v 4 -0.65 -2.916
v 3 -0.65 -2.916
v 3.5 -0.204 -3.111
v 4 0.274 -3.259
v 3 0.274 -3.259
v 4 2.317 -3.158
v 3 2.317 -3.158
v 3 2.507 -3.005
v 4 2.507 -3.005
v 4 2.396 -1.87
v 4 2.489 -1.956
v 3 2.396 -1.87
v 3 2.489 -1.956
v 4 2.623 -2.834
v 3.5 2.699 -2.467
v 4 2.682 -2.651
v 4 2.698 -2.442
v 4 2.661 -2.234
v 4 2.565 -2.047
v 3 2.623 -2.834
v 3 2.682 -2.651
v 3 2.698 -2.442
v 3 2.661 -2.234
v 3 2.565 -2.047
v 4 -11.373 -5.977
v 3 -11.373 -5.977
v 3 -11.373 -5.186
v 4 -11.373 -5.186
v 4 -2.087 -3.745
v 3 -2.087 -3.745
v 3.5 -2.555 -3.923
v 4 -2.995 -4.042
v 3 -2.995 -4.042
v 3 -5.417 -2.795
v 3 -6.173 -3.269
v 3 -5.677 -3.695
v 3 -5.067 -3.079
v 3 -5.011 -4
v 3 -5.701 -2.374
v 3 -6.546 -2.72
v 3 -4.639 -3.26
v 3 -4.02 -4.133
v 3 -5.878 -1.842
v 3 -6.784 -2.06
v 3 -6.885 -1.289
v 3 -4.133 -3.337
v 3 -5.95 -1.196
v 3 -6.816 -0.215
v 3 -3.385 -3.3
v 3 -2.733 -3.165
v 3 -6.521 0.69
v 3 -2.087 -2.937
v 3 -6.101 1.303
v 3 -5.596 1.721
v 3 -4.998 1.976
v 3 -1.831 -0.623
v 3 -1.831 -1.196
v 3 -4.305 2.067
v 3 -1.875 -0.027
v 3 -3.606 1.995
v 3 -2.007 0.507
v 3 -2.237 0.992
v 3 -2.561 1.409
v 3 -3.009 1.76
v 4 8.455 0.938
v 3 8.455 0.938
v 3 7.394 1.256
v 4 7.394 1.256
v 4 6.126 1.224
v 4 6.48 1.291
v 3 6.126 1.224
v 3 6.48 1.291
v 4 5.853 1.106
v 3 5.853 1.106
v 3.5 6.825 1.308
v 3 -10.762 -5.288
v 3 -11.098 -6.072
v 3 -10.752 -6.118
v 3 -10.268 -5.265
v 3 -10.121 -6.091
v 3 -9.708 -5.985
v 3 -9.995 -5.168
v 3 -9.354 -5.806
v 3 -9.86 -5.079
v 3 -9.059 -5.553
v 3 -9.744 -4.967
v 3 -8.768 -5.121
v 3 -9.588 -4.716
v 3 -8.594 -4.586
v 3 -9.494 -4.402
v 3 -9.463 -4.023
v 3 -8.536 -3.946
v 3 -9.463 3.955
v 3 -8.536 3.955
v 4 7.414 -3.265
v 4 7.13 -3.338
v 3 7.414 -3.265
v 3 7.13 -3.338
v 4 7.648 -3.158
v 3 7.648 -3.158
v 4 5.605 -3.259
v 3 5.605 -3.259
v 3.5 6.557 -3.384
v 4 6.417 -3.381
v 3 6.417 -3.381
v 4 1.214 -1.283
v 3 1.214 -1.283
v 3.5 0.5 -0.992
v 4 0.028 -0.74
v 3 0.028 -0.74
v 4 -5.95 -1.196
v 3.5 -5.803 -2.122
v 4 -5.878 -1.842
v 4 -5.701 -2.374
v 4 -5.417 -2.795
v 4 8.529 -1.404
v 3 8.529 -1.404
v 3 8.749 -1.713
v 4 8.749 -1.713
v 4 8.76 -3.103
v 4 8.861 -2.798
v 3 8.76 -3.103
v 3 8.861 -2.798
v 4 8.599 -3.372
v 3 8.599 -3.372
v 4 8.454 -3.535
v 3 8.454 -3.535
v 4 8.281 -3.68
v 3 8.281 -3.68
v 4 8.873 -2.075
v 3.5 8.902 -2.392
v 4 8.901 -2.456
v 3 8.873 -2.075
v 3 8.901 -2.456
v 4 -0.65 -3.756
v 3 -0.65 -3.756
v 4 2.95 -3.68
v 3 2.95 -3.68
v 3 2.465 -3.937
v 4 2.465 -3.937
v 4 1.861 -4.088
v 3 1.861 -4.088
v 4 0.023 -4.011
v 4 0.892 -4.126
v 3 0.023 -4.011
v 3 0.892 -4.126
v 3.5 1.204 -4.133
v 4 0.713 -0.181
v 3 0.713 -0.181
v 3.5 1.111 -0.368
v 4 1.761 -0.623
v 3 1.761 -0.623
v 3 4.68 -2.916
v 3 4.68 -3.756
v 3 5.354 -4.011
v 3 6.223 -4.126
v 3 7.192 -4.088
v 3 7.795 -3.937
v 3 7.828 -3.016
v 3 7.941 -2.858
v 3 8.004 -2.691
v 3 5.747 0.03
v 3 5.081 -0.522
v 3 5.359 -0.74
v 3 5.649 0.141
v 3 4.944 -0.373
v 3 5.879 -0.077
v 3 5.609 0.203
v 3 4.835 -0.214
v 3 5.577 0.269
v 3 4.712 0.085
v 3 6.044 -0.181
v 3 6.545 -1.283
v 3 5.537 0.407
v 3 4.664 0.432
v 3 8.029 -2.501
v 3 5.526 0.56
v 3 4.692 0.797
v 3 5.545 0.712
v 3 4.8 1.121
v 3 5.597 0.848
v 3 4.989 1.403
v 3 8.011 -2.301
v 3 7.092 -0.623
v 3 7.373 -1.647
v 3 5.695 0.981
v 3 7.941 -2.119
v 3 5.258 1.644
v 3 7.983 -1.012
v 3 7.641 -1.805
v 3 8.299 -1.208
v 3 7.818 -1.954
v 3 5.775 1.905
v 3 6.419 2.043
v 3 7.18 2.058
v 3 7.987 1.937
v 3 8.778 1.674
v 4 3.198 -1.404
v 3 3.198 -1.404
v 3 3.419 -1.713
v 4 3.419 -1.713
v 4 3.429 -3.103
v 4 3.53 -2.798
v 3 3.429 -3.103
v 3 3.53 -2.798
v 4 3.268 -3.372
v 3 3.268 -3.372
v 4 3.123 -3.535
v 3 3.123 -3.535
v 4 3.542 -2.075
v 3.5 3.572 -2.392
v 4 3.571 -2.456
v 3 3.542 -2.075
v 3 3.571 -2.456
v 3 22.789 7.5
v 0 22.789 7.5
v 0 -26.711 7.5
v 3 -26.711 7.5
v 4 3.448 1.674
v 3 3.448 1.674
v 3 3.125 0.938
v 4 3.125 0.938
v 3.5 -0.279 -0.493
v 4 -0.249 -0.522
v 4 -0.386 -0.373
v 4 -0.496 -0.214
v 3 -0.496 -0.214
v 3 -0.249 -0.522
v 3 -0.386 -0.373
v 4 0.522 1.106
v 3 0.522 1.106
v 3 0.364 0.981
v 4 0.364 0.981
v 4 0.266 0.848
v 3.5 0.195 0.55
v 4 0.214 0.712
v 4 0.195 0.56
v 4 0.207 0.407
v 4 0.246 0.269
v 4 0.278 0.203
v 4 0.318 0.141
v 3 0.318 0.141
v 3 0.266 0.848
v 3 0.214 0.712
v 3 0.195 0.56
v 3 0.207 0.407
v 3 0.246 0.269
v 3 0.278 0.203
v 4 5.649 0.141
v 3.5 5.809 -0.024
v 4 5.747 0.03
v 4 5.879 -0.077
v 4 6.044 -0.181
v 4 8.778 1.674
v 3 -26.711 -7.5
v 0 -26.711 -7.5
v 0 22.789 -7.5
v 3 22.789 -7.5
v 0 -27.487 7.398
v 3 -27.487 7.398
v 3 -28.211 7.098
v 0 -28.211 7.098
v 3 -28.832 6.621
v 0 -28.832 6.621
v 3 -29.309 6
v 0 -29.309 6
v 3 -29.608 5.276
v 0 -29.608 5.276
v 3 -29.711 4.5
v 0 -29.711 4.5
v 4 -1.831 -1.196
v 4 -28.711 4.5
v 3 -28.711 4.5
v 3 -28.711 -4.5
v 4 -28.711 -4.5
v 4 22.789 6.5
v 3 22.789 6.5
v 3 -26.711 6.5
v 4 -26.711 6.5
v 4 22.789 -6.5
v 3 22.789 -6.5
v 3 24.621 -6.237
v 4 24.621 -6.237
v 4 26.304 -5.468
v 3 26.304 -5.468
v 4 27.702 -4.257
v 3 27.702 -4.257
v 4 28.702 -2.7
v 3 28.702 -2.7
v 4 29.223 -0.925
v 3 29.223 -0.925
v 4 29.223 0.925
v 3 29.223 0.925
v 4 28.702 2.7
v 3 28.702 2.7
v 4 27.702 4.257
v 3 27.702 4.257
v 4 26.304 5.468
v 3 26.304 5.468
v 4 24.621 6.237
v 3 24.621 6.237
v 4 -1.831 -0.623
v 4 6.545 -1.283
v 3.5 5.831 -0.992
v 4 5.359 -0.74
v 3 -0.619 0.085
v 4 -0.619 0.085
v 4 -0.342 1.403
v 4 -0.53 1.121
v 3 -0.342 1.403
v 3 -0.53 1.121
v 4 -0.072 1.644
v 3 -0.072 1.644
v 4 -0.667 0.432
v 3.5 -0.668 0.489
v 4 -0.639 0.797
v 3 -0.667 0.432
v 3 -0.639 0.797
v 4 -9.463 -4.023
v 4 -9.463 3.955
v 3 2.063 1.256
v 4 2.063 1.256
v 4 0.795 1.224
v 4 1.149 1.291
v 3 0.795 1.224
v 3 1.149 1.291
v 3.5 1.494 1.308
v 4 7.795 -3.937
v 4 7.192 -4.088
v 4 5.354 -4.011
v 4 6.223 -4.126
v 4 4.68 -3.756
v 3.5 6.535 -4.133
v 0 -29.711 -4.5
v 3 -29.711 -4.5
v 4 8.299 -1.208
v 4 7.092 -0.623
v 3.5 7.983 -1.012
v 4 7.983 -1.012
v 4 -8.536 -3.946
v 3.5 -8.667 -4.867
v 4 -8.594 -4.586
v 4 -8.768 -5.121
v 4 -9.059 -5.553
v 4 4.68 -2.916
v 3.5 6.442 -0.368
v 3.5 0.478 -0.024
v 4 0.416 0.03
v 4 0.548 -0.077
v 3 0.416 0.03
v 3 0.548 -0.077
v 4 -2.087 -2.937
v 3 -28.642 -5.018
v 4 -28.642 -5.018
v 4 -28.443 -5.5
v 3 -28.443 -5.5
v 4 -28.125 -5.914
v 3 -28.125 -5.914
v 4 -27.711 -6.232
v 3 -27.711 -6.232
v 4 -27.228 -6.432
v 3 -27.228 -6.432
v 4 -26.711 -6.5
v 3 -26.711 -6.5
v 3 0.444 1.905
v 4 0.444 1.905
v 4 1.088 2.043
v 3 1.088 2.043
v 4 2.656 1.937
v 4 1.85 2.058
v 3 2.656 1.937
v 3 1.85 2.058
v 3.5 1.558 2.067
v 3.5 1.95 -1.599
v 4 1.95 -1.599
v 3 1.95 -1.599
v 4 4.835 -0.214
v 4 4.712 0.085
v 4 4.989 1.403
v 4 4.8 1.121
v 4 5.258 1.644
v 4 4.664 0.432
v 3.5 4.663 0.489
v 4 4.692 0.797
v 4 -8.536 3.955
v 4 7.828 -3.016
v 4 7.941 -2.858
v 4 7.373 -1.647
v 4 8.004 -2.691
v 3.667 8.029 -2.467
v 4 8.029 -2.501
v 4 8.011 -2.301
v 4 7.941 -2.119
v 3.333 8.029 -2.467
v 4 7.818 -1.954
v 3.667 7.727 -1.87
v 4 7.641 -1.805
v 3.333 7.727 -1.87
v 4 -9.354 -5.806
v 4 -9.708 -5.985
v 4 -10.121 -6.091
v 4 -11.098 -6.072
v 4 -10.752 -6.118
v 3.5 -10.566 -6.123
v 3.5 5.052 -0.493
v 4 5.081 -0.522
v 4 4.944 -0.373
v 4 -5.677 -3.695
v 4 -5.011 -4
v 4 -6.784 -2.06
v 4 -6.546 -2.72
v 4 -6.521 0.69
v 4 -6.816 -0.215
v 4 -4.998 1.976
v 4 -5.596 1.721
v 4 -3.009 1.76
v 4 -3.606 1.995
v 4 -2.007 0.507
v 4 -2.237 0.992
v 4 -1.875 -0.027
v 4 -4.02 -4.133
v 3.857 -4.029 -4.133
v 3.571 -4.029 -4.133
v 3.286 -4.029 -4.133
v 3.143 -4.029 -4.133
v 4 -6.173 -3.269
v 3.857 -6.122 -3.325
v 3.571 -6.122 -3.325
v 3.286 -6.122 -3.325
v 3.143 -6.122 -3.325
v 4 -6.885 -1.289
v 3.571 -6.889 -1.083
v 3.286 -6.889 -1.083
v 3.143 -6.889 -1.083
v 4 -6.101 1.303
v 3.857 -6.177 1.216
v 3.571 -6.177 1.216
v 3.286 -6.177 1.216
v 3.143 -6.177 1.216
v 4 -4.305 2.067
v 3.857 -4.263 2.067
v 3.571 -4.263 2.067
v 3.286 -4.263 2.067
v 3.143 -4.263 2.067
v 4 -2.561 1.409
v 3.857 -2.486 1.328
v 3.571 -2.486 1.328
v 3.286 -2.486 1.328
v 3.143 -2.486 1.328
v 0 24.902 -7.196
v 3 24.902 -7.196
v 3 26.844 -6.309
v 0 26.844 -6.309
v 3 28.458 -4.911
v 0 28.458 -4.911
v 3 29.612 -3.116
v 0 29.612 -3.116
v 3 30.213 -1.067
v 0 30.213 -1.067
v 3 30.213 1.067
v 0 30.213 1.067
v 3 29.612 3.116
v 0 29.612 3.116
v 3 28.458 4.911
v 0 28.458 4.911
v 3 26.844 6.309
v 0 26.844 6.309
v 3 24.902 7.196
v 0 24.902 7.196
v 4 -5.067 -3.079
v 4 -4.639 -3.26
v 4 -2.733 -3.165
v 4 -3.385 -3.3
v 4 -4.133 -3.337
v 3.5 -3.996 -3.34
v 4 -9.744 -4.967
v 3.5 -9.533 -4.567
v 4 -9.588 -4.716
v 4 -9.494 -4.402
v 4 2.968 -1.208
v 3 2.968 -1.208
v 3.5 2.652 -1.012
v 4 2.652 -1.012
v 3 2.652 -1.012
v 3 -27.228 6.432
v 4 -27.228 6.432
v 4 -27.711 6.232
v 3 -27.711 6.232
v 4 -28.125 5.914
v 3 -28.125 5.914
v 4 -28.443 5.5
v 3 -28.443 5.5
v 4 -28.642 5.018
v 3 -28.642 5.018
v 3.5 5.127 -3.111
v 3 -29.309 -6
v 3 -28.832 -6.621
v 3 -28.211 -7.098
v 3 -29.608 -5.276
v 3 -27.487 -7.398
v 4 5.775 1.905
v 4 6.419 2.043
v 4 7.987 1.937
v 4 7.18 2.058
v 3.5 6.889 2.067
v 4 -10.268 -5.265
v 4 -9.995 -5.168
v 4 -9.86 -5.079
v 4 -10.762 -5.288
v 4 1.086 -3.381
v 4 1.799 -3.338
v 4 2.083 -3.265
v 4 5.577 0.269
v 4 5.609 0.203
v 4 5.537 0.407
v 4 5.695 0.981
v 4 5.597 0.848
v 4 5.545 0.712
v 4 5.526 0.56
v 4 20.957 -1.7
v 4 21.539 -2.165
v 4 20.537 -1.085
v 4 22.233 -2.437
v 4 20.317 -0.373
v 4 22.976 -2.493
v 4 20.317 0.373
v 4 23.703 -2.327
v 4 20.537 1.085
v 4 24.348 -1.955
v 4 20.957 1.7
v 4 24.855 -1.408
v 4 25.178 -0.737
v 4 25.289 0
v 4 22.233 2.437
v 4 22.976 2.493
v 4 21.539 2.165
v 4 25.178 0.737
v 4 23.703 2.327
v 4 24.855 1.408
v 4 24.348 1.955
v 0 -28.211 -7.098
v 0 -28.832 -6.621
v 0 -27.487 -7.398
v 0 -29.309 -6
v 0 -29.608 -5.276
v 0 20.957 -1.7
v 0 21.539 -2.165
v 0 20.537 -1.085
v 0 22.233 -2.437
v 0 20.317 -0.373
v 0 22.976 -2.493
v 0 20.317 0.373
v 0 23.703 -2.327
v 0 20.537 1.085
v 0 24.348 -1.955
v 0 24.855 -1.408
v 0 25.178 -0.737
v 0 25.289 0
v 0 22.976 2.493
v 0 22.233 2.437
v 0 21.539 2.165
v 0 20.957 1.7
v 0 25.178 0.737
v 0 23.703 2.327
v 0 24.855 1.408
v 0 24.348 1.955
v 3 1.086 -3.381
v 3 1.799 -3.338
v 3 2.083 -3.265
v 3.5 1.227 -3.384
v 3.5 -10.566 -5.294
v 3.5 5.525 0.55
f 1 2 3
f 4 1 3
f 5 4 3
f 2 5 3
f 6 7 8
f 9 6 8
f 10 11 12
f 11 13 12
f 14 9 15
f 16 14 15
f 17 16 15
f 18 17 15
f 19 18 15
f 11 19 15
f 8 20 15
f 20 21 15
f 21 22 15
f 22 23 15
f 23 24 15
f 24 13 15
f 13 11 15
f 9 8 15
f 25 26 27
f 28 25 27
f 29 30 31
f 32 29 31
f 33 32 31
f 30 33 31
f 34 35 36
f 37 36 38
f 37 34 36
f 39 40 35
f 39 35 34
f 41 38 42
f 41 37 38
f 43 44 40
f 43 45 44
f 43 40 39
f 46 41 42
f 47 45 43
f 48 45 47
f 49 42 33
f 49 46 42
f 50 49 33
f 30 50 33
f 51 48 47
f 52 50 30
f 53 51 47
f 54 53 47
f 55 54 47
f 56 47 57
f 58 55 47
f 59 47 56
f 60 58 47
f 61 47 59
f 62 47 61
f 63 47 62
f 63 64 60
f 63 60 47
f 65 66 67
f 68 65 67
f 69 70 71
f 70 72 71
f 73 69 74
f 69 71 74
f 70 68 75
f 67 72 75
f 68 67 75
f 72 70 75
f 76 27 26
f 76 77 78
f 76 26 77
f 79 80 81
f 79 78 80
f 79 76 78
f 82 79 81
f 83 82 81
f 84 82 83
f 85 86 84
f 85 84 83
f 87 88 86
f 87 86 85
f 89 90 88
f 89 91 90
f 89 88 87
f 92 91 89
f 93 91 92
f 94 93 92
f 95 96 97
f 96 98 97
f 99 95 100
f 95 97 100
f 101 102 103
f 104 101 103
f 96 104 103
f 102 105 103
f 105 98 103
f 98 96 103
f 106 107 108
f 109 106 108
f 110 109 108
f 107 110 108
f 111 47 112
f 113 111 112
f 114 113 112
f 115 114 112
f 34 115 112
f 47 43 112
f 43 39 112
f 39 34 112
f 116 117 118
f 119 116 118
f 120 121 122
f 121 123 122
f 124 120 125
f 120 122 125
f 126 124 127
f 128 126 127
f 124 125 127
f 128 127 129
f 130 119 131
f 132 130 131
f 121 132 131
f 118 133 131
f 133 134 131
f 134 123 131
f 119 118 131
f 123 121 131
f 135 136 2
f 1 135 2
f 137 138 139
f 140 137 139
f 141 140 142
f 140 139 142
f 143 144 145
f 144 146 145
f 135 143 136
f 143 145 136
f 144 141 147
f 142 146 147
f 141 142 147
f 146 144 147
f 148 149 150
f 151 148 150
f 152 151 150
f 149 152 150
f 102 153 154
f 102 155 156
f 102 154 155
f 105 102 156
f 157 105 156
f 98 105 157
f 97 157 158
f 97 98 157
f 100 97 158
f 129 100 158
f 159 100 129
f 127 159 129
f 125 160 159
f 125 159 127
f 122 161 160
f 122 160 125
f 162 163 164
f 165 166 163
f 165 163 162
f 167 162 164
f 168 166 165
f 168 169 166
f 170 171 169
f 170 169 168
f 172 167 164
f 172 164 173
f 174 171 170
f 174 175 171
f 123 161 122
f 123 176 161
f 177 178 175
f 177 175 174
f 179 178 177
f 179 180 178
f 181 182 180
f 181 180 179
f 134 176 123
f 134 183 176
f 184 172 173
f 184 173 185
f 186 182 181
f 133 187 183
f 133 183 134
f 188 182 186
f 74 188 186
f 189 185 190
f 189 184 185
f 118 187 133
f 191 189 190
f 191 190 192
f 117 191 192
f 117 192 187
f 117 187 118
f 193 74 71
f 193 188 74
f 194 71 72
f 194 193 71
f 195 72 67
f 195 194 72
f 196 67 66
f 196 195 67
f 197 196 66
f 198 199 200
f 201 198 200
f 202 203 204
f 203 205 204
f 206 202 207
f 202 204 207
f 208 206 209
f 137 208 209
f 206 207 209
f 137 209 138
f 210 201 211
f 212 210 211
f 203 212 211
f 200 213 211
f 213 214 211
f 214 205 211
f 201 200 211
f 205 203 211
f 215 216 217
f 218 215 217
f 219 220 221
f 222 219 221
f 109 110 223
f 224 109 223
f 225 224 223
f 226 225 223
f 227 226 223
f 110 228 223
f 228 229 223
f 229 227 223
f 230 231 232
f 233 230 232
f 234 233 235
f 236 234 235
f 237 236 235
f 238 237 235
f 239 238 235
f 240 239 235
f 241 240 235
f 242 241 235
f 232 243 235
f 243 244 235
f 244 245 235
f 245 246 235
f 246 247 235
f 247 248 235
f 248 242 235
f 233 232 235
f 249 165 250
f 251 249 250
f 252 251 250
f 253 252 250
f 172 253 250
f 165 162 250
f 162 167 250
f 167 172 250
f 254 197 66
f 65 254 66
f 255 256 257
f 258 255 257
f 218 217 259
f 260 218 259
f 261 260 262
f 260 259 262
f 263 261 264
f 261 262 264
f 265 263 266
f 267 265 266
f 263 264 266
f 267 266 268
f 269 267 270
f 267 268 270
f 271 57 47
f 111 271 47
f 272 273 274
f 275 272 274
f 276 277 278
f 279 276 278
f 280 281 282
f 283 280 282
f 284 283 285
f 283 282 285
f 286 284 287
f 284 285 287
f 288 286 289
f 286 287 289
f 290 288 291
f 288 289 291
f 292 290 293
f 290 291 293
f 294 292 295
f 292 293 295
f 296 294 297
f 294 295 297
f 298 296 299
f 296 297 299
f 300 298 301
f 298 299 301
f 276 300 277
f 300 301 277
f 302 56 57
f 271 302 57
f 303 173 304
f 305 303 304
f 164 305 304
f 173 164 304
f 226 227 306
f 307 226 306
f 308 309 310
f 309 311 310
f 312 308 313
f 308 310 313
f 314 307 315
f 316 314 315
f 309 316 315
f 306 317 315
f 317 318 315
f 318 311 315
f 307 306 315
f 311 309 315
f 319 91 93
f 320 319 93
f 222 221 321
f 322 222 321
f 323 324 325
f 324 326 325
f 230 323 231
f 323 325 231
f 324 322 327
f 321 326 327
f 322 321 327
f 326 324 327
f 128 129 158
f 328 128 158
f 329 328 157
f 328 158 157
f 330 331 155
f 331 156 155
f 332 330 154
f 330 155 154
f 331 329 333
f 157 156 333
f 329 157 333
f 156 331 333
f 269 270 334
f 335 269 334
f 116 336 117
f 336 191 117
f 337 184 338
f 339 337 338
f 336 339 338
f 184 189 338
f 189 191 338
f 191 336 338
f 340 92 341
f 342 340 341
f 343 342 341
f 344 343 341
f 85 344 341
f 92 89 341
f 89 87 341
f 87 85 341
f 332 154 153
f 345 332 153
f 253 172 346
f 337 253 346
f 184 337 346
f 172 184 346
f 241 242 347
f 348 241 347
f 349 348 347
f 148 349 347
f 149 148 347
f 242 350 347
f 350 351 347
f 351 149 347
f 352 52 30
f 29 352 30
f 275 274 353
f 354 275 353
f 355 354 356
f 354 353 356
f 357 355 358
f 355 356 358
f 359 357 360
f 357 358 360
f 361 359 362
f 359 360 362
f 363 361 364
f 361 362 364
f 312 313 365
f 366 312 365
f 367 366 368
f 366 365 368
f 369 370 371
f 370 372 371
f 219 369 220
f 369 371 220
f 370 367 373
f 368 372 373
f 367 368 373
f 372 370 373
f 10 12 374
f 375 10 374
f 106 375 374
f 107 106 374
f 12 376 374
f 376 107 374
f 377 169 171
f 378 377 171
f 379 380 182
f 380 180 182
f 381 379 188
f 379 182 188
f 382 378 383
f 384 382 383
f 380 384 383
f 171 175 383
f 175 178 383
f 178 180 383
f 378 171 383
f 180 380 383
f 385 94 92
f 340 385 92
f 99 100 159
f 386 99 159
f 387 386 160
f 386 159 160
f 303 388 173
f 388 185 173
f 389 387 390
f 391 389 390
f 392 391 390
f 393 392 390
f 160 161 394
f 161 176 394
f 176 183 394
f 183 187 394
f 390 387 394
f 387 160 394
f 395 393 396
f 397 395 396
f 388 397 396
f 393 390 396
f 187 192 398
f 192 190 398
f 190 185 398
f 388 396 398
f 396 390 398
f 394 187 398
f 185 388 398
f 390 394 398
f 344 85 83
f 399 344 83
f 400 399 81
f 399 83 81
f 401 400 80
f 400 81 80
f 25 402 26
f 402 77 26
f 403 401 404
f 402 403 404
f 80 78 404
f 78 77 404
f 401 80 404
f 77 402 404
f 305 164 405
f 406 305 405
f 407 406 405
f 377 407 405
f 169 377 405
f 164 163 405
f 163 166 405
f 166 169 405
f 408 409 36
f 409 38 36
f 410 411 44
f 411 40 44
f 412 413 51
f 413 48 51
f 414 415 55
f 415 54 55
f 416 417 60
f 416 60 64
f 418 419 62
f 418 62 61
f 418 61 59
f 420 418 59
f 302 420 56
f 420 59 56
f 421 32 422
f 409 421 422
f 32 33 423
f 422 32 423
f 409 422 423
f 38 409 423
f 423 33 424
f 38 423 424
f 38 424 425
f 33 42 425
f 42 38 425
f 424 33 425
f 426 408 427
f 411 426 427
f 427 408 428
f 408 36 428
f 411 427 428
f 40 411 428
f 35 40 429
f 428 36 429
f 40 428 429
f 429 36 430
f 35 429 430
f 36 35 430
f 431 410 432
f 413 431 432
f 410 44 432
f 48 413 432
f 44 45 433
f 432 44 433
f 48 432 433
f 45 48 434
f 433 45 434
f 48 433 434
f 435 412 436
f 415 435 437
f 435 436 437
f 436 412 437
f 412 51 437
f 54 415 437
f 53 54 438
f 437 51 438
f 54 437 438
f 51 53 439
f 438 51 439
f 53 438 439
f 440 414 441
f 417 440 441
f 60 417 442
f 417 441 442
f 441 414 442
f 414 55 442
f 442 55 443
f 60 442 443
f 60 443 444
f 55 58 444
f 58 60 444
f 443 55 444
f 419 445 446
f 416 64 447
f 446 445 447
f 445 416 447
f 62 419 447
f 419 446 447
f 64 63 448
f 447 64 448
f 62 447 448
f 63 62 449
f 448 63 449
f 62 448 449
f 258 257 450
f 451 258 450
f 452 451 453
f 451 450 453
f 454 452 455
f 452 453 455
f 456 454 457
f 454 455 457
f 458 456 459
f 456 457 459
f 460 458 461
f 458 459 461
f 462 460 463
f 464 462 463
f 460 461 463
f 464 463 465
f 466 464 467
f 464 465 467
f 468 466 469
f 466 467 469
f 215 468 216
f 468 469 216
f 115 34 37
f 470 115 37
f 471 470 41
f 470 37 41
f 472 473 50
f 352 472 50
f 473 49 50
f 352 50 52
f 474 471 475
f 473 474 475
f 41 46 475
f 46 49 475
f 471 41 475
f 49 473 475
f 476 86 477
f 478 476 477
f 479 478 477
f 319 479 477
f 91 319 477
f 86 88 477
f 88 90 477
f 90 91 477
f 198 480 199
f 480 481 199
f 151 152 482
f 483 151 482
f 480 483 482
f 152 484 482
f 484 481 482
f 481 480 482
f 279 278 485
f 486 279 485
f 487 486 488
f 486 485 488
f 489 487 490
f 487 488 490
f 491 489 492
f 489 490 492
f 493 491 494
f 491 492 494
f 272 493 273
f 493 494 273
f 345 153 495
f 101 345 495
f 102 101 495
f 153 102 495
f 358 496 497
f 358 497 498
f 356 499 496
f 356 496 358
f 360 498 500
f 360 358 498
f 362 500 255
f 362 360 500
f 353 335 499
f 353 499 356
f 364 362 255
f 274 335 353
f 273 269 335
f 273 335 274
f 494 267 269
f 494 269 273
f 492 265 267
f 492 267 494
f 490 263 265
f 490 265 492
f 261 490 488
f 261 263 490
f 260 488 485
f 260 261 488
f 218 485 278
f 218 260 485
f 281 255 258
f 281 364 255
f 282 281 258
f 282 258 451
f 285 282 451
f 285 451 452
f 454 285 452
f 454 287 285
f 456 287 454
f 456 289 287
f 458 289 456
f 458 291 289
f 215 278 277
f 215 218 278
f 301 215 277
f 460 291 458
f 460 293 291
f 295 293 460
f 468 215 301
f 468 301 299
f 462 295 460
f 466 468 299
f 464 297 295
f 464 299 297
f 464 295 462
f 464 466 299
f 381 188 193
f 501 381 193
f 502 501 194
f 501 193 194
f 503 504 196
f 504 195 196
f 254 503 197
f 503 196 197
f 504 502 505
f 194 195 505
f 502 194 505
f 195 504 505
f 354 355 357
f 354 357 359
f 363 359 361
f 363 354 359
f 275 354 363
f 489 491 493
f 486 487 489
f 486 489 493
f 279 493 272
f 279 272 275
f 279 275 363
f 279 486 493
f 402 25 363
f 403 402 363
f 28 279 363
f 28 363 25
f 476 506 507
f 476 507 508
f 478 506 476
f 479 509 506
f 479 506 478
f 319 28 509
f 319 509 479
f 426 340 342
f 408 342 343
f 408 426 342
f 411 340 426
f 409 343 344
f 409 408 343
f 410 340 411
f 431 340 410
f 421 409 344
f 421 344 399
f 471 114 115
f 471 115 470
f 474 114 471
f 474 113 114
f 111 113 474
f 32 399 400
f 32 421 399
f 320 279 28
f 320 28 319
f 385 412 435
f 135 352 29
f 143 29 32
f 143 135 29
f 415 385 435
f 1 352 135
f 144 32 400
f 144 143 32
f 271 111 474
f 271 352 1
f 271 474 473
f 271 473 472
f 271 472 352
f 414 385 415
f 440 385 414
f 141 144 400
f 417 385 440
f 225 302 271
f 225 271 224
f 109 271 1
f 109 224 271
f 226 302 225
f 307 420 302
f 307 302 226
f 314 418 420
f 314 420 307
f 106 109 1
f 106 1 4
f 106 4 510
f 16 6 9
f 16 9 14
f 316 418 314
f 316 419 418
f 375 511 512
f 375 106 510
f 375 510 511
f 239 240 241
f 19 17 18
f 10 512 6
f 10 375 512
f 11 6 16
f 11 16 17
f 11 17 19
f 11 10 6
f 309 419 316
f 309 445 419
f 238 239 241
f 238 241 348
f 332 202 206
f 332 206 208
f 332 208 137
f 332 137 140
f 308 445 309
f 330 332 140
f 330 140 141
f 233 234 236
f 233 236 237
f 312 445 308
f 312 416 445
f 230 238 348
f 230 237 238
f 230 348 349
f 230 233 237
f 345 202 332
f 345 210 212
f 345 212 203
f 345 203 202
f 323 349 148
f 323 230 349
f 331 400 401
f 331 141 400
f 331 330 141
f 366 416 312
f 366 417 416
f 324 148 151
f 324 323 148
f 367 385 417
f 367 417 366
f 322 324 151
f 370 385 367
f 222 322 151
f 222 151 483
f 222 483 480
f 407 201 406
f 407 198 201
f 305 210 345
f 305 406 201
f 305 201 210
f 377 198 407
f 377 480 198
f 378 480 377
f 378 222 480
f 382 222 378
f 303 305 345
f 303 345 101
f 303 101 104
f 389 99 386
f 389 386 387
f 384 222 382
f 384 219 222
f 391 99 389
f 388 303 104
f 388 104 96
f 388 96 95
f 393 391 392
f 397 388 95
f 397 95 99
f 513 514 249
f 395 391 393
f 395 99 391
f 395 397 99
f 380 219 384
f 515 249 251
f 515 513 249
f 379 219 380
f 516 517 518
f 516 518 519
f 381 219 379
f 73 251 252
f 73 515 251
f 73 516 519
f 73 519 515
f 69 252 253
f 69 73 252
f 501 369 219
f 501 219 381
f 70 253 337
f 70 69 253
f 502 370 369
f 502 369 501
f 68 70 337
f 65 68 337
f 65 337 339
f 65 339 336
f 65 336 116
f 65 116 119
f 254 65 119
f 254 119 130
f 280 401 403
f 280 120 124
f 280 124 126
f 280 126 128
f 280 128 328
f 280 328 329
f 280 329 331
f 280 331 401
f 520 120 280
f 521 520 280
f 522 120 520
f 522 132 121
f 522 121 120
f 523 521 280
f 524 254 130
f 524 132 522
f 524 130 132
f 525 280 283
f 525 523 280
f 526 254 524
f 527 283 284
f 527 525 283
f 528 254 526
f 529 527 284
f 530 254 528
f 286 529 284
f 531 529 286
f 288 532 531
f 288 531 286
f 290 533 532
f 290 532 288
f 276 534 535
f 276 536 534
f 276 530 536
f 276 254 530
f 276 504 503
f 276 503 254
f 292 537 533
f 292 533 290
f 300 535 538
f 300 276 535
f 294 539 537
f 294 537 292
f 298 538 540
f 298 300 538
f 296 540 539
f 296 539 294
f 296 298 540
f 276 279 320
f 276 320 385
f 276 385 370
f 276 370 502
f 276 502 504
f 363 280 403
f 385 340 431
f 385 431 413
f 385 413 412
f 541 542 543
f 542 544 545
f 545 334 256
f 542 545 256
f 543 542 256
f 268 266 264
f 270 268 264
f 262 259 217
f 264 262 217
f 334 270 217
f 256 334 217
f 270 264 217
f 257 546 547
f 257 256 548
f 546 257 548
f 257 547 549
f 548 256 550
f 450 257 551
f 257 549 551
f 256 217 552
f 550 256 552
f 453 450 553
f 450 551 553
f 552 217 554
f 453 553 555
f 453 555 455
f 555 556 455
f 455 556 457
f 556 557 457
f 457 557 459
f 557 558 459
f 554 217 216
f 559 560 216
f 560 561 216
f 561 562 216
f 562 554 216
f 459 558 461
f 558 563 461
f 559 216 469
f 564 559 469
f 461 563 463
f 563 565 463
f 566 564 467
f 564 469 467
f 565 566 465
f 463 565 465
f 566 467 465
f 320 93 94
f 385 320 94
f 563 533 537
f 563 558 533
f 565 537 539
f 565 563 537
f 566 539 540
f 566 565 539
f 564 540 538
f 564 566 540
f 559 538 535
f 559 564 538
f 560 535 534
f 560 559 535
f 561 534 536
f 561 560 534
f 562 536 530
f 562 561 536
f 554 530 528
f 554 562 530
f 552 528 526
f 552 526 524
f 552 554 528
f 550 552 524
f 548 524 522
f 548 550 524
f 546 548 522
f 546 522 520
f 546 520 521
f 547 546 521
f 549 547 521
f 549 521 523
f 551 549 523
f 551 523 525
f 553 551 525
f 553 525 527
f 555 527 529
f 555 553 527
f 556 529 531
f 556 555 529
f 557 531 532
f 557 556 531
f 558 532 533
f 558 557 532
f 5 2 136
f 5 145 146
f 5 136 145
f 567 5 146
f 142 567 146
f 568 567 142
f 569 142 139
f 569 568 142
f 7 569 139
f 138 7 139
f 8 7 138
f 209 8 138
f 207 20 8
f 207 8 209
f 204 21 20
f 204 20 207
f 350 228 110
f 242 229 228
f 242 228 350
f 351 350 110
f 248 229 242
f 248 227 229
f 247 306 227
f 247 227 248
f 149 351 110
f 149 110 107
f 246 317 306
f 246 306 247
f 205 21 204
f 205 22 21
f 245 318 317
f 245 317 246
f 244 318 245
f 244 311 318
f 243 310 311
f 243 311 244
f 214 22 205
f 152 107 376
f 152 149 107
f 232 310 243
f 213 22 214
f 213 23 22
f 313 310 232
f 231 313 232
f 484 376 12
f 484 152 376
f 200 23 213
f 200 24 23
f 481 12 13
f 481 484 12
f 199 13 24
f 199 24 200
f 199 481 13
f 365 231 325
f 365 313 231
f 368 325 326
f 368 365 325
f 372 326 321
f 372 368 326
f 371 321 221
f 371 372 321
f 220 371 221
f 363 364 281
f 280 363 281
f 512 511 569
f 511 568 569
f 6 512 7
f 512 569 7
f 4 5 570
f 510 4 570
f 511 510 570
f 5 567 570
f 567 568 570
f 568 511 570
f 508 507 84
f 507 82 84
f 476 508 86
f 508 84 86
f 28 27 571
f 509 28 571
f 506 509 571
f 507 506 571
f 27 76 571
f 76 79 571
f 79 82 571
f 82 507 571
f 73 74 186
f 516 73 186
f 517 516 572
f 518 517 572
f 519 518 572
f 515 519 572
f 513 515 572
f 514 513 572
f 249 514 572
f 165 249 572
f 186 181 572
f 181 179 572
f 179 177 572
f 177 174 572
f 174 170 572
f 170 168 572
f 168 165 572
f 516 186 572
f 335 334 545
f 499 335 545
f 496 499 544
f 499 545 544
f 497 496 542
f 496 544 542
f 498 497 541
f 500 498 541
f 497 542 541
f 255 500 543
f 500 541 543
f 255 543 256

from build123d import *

# Parameters (mm, degrees)
F0_R     = 2.5
F1_DEPTH = 3
F2_R     = 2.5
F3_DEPTH = 1


# Not quite as in the source:
# - a feature names something its author has since deleted; it is built from what else it names


with BuildPart() as f1:
    # F0 (on Right) → F1 (new body)
    with BuildSketch(Plane.YZ):
        with BuildLine():
            Line((22.7894122154, 7.5), (-26.7105877846, 7.5))
            ThreePointArc((-26.7105877846, 7.5), (-28.8319081282, 6.6213203436), (-29.7105877846, 4.5))
            Line((-29.7105877846, 4.5), (-29.7105877846, -4.5))
            ThreePointArc((-29.7105877846, -4.5), (-28.8319081282, -6.6213203436), (-26.7105877846, -7.5))
            Line((-26.7105877846, -7.5), (22.7894122154, -7.5))
            ThreePointArc((22.7894122154, -7.5), (30.2894122154, 0), (22.7894122154, 7.5))
        make_face()
        with Locations((22.7894122154, 0)):
            Circle(F0_R, mode=Mode.SUBTRACT)
    extrude(amount=F1_DEPTH)

    # F2 (on face) → F3 (join)
    with BuildSketch(Plane.YZ.offset(3)):
        with BuildLine():
            Line((22.7894122154, 6.5), (-26.7105877846, 6.5))
            ThreePointArc((-26.7105877846, 6.5), (-28.124801347, 5.9142135624), (-28.7105877846, 4.5))
            Line((-28.7105877846, 4.5), (-28.7105877846, -4.5))
            ThreePointArc((-28.7105877846, -4.5), (-28.124801347, -5.9142135624), (-26.7105877846, -6.5))
            Line((-26.7105877846, -6.5), (22.7894122154, -6.5))
            ThreePointArc((22.7894122154, -6.5), (29.2894122154, 0), (22.7894122154, 6.5))
        make_face()
        with BuildLine():
            add(Edge.make_bspline(
                [(-9.0594911449, -5.5533798952), (-9.5833125468, -6.1234721876), (-10.5663507109, -6.1234721876)],
                knots=[0, 0, 0, 1, 1, 1], degree=2))
            add(Edge.make_bspline(
                [(-10.5663507109, -6.1234721876), (-11.0779496134, -6.1234721876), (-11.3730356697, -5.9768021951)],
                knots=[0, 0, 0, 1, 1, 1], degree=2))
            Line((-11.3730356697, -5.9768021951), (-11.3730356697, -5.1858318783))
            add(Edge.make_bspline(
                [(-11.3730356697, -5.1858318783), (-10.9854078324, -5.2940883013), (-10.5663507109, -5.2940883013)],
                knots=[0, 0, 0, 1, 1, 1], degree=2))
            add(Edge.make_bspline(
                [(-10.5663507109, -5.2940883013), (-10.0250685957, -5.2940883013), (-9.74395111, -4.9666999252)],
                knots=[0, 0, 0, 1, 1, 1], degree=2))
            add(Edge.make_bspline(
                [(-9.74395111, -4.9666999252), (-9.4628336243, -4.639311549), (-9.4628336243, -4.0229483662)],
                knots=[0, 0, 0, 1, 1, 1], degree=2))
            Line((-9.4628336243, -4.0229483662), (-9.4628336243, 3.9548515839))
            Line((-9.4628336243, 3.9548515839), (-8.5356697431, 3.9548515839))
            Line((-8.5356697431, 3.9548515839), (-8.5356697431, -3.9461212272))
            add(Edge.make_bspline(
                [(-8.5356697431, -3.9461212272), (-8.5356697431, -4.9832876029), (-9.0594911449, -5.5533798952)],
                knots=[0, 0, 0, 1, 1, 1], degree=2))
        make_face(mode=Mode.SUBTRACT)
        with BuildLine():
            add(Edge.make_bspline(
                [(-2.9953853829, -4.0421551509), (-3.4231728611, -4.1329508606), (-4.0290596159, -4.1329508606)],
                knots=[0, 0, 0, 1, 1, 1], degree=2))
            add(Edge.make_bspline(
                [(-4.0290596159, -4.1329508606), (-5.3543277625, -4.1329508606), (-6.1217261162, -3.3245198304)],
                knots=[0, 0, 0, 1, 1, 1], degree=2))
            add(Edge.make_bspline(
                [(-6.1217261162, -3.3245198304), (-6.8891244699, -2.5160888002), (-6.8891244699, -1.0825642305)],
                knots=[0, 0, 0, 1, 1, 1], degree=2))
            add(Edge.make_bspline(
                [(-6.8891244699, -1.0825642305), (-6.8891244699, 0.36492891), (-6.1767273634, 1.216138688)],
                knots=[0, 0, 0, 1, 1, 1], degree=2))
            add(Edge.make_bspline(
                [(-6.1767273634, 1.216138688), (-5.4643302569, 2.067348466), (-4.2630331754, 2.067348466)],
                knots=[0, 0, 0, 1, 1, 1], degree=2))
            add(Edge.make_bspline(
                [(-4.2630331754, 2.067348466), (-3.1403093041, 2.067348466), (-2.4855325518, 1.3278872537)],
                knots=[0, 0, 0, 1, 1, 1], degree=2))
            add(Edge.make_bspline(
                [(-2.4855325518, 1.3278872537), (-1.8307557995, 0.5884260414), (-1.8307557995, -0.6233474682)],
                knots=[0, 0, 0, 1, 1, 1], degree=2))
            Line((-1.8307557995, -0.6233474682), (-1.8307557995, -1.1960588675))
            Line((-1.8307557995, -1.1960588675), (-5.9497380893, -1.1960588675))
            add(Edge.make_bspline(
                [(-5.9497380893, -1.1960588675), (-5.9218009479, -2.2489398853), (-5.4171863308, -2.7945871788)],
                knots=[0, 0, 0, 1, 1, 1], degree=2))
            add(Edge.make_bspline(
                [(-5.4171863308, -2.7945871788), (-4.9125717136, -3.3402344724), (-3.9958842604, -3.3402344724)],
                knots=[0, 0, 0, 1, 1, 1], degree=2))
            add(Edge.make_bspline(
                [(-3.9958842604, -3.3402344724), (-3.0303068097, -3.3402344724), (-2.0874282864, -2.936891993)],
                knots=[0, 0, 0, 1, 1, 1], degree=2))
            Line((-2.0874282864, -2.936891993), (-2.0874282864, -3.7453230232))
            add(Edge.make_bspline(
                [(-2.0874282864, -3.7453230232), (-2.5675979047, -3.9513594413), (-2.9953853829, -4.0421551509)],
                knots=[0, 0, 0, 1, 1, 1], degree=2))
        make_face(mode=Mode.SUBTRACT)
        with BuildLine():
            add(Edge.make_bspline(
                [(3.1979296583, -1.4038413569), (3.5715889249, -1.7967074083), (3.5715889249, -2.3921177351)],
                knots=[0, 0, 0, 1, 1, 1], degree=2))
            add(Edge.make_bspline(
                [(3.5715889249, -2.3921177351), (3.5715889249, -3.2267398354), (2.9499875281, -3.679845348)],
                knots=[0, 0, 0, 1, 1, 1], degree=2))
            add(Edge.make_bspline(
                [(2.9499875281, -3.679845348), (2.3283861312, -4.1329508606), (1.2039161886, -4.1329508606)],
                knots=[0, 0, 0, 1, 1, 1], degree=2))
            add(Edge.make_bspline(
                [(1.2039161886, -4.1329508606), (0.0148416064, -4.1329508606), (-0.650411574, -3.7557994512)],
                knots=[0, 0, 0, 1, 1, 1], degree=2))
            Line((-0.650411574, -3.7557994512), (-0.650411574, -2.9159391369))
            add(Edge.make_bspline(
                [(-0.650411574, -2.9159391369), (-0.2191319531, -3.1341980544), (0.2741332003, -3.2590421552)],
                knots=[0, 0, 0, 1, 1, 1], degree=2))
            add(Edge.make_bspline(
                [(0.2741332003, -3.2590421552), (0.7673983537, -3.3838862559), (1.226615116, -3.3838862559)],
                knots=[0, 0, 0, 1, 1, 1], degree=2))
            add(Edge.make_bspline(
                [(1.226615116, -3.3838862559), (1.9355200798, -3.3838862559), (2.3170366675, -3.1577700175)],
                knots=[0, 0, 0, 1, 1, 1], degree=2))
            add(Edge.make_bspline(
                [(2.3170366675, -3.1577700175), (2.6985532552, -2.931653779), (2.6985532552, -2.4671988027)],
                knots=[0, 0, 0, 1, 1, 1], degree=2))
            add(Edge.make_bspline(
                [(2.6985532552, -2.4671988027), (2.6985532552, -2.1179845348), (2.3964829134, -1.8700424046)],
                knots=[0, 0, 0, 1, 1, 1], degree=2))
            add(Edge.make_bspline(
                [(2.3964829134, -1.8700424046), (2.0944125717, -1.6221002744), (1.2143926166, -1.2833624345)],
                knots=[0, 0, 0, 1, 1, 1], degree=2))
            add(Edge.make_bspline(
                [(1.2143926166, -1.2833624345), (0.3797705163, -0.9725617361), (0.0279371414, -0.7403342479)],
                knots=[0, 0, 0, 1, 1, 1], degree=2))
            add(Edge.make_bspline(
                [(0.0279371414, -0.7403342479), (-0.3238962335, -0.5081067598), (-0.4958842604, -0.2138937391)],
                knots=[0, 0, 0, 1, 1, 1], degree=2))
            add(Edge.make_bspline(
                [(-0.4958842604, -0.2138937391), (-0.6678722874, 0.0803192816), (-0.6678722874, 0.4888999751)],
                knots=[0, 0, 0, 1, 1, 1], degree=2))
            add(Edge.make_bspline(
                [(-0.6678722874, 0.4888999751), (-0.6678722874, 1.2205038663), (-0.0724619606, 1.6439261661)],
                knots=[0, 0, 0, 1, 1, 1], degree=2))
            add(Edge.make_bspline(
                [(-0.0724619606, 1.6439261661), (0.5229483662, 2.067348466), (1.5583686705, 2.067348466)],
                knots=[0, 0, 0, 1, 1, 1], degree=2))
            add(Edge.make_bspline(
                [(1.5583686705, 2.067348466), (2.5239461212, 2.067348466), (3.4476178598, 1.6744824146)],
                knots=[0, 0, 0, 1, 1, 1], degree=2))
            Line((3.4476178598, 1.6744824146), (3.124594662, 0.9376403093))
            add(Edge.make_bspline(
                [(3.124594662, 0.9376403093), (2.2253679222, 1.3078074333), (1.4937640309, 1.3078074333)],
                knots=[0, 0, 0, 1, 1, 1], degree=2))
            add(Edge.make_bspline(
                [(1.4937640309, 1.3078074333), (0.8494637067, 1.3078074333), (0.5220753305, 1.1061361936)],
                knots=[0, 0, 0, 1, 1, 1], degree=2))
            add(Edge.make_bspline(
                [(0.5220753305, 1.1061361936), (0.1946869544, 0.9044649539), (0.1946869544, 0.5500124719)],
                knots=[0, 0, 0, 1, 1, 1], degree=2))
            add(Edge.make_bspline(
                [(0.1946869544, 0.5500124719), (0.1946869544, 0.3090546271), (0.3177849838, 0.1405587428)],
                knots=[0, 0, 0, 1, 1, 1], degree=2))
            add(Edge.make_bspline(
                [(0.3177849838, 0.1405587428), (0.4408830132, -0.0279371414), (0.7132701422, -0.1807183836)],
                knots=[0, 0, 0, 1, 1, 1], degree=2))
            add(Edge.make_bspline(
                [(0.7132701422, -0.1807183836), (0.9856572711, -0.3334996258), (1.7609129459, -0.6233474682)],
                knots=[0, 0, 0, 1, 1, 1], degree=2))
            add(Edge.make_bspline(
                [(1.7609129459, -0.6233474682), (2.8242703916, -1.0109753056), (3.1979296583, -1.4038413569)],
                knots=[0, 0, 0, 1, 1, 1], degree=2))
        make_face(mode=Mode.SUBTRACT)
        with BuildLine():
            add(Edge.make_bspline(
                [(8.5286854577, -1.4038413569), (8.9023447244, -1.7967074083), (8.9023447244, -2.3921177351)],
                knots=[0, 0, 0, 1, 1, 1], degree=2))
            add(Edge.make_bspline(
                [(8.9023447244, -2.3921177351), (8.9023447244, -3.2267398354), (8.2807433275, -3.679845348)],
                knots=[0, 0, 0, 1, 1, 1], degree=2))
            add(Edge.make_bspline(
                [(8.2807433275, -3.679845348), (7.6591419307, -4.1329508606), (6.534671988, -4.1329508606)],
                knots=[0, 0, 0, 1, 1, 1], degree=2))
            add(Edge.make_bspline(
                [(6.534671988, -4.1329508606), (5.3455974058, -4.1329508606), (4.6803442255, -3.7557994512)],
                knots=[0, 0, 0, 1, 1, 1], degree=2))
            Line((4.6803442255, -3.7557994512), (4.6803442255, -2.9159391369))
            add(Edge.make_bspline(
                [(4.6803442255, -2.9159391369), (5.1116238463, -3.1341980544), (5.6048889998, -3.2590421552)],
                knots=[0, 0, 0, 1, 1, 1], degree=2))
            add(Edge.make_bspline(
                [(5.6048889998, -3.2590421552), (6.0981541532, -3.3838862559), (6.5573709154, -3.3838862559)],
                knots=[0, 0, 0, 1, 1, 1], degree=2))
            add(Edge.make_bspline(
                [(6.5573709154, -3.3838862559), (7.2662758793, -3.3838862559), (7.6477924669, -3.1577700175)],
                knots=[0, 0, 0, 1, 1, 1], degree=2))
            add(Edge.make_bspline(
                [(7.6477924669, -3.1577700175), (8.0293090546, -2.931653779), (8.0293090546, -2.4671988027)],
                knots=[0, 0, 0, 1, 1, 1], degree=2))
            add(Edge.make_bspline(
                [(8.0293090546, -2.4671988027), (8.0293090546, -2.1179845348), (7.7272387129, -1.8700424046)],
                knots=[0, 0, 0, 1, 1, 1], degree=2))
            add(Edge.make_bspline(
                [(7.7272387129, -1.8700424046), (7.4251683712, -1.6221002744), (6.5451484161, -1.2833624345)],
                knots=[0, 0, 0, 1, 1, 1], degree=2))
            add(Edge.make_bspline(
                [(6.5451484161, -1.2833624345), (5.7105263158, -0.9725617361), (5.3586929409, -0.7403342479)],
                knots=[0, 0, 0, 1, 1, 1], degree=2))
            add(Edge.make_bspline(
                [(5.3586929409, -0.7403342479), (5.006859566, -0.5081067598), (4.834871539, -0.2138937391)],
                knots=[0, 0, 0, 1, 1, 1], degree=2))
            add(Edge.make_bspline(
                [(4.834871539, -0.2138937391), (4.6628835121, 0.0803192816), (4.6628835121, 0.4888999751)],
                knots=[0, 0, 0, 1, 1, 1], degree=2))
            add(Edge.make_bspline(
                [(4.6628835121, 0.4888999751), (4.6628835121, 1.2205038663), (5.2582938389, 1.6439261661)],
                knots=[0, 0, 0, 1, 1, 1], degree=2))
            add(Edge.make_bspline(
                [(5.2582938389, 1.6439261661), (5.8537041656, 2.067348466), (6.8891244699, 2.067348466)],
                knots=[0, 0, 0, 1, 1, 1], degree=2))
            add(Edge.make_bspline(
                [(6.8891244699, 2.067348466), (7.8547019207, 2.067348466), (8.7783736593, 1.6744824146)],
                knots=[0, 0, 0, 1, 1, 1], degree=2))
            Line((8.7783736593, 1.6744824146), (8.4553504615, 0.9376403093))
            add(Edge.make_bspline(
                [(8.4553504615, 0.9376403093), (7.5561237216, 1.3078074333), (6.8245198304, 1.3078074333)],
                knots=[0, 0, 0, 1, 1, 1], degree=2))
            add(Edge.make_bspline(
                [(6.8245198304, 1.3078074333), (6.1802195061, 1.3078074333), (5.85283113, 1.1061361936)],
                knots=[0, 0, 0, 1, 1, 1], degree=2))
            add(Edge.make_bspline(
                [(5.85283113, 1.1061361936), (5.5254427538, 0.9044649539), (5.5254427538, 0.5500124719)],
                knots=[0, 0, 0, 1, 1, 1], degree=2))
            add(Edge.make_bspline(
                [(5.5254427538, 0.5500124719), (5.5254427538, 0.3090546271), (5.6485407832, 0.1405587428)],
                knots=[0, 0, 0, 1, 1, 1], degree=2))
            add(Edge.make_bspline(
                [(5.6485407832, 0.1405587428), (5.7716388127, -0.0279371414), (6.0440259416, -0.1807183836)],
                knots=[0, 0, 0, 1, 1, 1], degree=2))
            add(Edge.make_bspline(
                [(6.0440259416, -0.1807183836), (6.3164130706, -0.3334996258), (7.0916687453, -0.6233474682)],
                knots=[0, 0, 0, 1, 1, 1], degree=2))
            add(Edge.make_bspline(
                [(7.0916687453, -0.6233474682), (8.1550261911, -1.0109753056), (8.5286854577, -1.4038413569)],
                knots=[0, 0, 0, 1, 1, 1], degree=2))
        make_face(mode=Mode.SUBTRACT)
        with Locations((22.7894122154, 0)):
            Circle(F2_R, mode=Mode.SUBTRACT)
    extrude(amount=F3_DEPTH)


solid = f1.part
